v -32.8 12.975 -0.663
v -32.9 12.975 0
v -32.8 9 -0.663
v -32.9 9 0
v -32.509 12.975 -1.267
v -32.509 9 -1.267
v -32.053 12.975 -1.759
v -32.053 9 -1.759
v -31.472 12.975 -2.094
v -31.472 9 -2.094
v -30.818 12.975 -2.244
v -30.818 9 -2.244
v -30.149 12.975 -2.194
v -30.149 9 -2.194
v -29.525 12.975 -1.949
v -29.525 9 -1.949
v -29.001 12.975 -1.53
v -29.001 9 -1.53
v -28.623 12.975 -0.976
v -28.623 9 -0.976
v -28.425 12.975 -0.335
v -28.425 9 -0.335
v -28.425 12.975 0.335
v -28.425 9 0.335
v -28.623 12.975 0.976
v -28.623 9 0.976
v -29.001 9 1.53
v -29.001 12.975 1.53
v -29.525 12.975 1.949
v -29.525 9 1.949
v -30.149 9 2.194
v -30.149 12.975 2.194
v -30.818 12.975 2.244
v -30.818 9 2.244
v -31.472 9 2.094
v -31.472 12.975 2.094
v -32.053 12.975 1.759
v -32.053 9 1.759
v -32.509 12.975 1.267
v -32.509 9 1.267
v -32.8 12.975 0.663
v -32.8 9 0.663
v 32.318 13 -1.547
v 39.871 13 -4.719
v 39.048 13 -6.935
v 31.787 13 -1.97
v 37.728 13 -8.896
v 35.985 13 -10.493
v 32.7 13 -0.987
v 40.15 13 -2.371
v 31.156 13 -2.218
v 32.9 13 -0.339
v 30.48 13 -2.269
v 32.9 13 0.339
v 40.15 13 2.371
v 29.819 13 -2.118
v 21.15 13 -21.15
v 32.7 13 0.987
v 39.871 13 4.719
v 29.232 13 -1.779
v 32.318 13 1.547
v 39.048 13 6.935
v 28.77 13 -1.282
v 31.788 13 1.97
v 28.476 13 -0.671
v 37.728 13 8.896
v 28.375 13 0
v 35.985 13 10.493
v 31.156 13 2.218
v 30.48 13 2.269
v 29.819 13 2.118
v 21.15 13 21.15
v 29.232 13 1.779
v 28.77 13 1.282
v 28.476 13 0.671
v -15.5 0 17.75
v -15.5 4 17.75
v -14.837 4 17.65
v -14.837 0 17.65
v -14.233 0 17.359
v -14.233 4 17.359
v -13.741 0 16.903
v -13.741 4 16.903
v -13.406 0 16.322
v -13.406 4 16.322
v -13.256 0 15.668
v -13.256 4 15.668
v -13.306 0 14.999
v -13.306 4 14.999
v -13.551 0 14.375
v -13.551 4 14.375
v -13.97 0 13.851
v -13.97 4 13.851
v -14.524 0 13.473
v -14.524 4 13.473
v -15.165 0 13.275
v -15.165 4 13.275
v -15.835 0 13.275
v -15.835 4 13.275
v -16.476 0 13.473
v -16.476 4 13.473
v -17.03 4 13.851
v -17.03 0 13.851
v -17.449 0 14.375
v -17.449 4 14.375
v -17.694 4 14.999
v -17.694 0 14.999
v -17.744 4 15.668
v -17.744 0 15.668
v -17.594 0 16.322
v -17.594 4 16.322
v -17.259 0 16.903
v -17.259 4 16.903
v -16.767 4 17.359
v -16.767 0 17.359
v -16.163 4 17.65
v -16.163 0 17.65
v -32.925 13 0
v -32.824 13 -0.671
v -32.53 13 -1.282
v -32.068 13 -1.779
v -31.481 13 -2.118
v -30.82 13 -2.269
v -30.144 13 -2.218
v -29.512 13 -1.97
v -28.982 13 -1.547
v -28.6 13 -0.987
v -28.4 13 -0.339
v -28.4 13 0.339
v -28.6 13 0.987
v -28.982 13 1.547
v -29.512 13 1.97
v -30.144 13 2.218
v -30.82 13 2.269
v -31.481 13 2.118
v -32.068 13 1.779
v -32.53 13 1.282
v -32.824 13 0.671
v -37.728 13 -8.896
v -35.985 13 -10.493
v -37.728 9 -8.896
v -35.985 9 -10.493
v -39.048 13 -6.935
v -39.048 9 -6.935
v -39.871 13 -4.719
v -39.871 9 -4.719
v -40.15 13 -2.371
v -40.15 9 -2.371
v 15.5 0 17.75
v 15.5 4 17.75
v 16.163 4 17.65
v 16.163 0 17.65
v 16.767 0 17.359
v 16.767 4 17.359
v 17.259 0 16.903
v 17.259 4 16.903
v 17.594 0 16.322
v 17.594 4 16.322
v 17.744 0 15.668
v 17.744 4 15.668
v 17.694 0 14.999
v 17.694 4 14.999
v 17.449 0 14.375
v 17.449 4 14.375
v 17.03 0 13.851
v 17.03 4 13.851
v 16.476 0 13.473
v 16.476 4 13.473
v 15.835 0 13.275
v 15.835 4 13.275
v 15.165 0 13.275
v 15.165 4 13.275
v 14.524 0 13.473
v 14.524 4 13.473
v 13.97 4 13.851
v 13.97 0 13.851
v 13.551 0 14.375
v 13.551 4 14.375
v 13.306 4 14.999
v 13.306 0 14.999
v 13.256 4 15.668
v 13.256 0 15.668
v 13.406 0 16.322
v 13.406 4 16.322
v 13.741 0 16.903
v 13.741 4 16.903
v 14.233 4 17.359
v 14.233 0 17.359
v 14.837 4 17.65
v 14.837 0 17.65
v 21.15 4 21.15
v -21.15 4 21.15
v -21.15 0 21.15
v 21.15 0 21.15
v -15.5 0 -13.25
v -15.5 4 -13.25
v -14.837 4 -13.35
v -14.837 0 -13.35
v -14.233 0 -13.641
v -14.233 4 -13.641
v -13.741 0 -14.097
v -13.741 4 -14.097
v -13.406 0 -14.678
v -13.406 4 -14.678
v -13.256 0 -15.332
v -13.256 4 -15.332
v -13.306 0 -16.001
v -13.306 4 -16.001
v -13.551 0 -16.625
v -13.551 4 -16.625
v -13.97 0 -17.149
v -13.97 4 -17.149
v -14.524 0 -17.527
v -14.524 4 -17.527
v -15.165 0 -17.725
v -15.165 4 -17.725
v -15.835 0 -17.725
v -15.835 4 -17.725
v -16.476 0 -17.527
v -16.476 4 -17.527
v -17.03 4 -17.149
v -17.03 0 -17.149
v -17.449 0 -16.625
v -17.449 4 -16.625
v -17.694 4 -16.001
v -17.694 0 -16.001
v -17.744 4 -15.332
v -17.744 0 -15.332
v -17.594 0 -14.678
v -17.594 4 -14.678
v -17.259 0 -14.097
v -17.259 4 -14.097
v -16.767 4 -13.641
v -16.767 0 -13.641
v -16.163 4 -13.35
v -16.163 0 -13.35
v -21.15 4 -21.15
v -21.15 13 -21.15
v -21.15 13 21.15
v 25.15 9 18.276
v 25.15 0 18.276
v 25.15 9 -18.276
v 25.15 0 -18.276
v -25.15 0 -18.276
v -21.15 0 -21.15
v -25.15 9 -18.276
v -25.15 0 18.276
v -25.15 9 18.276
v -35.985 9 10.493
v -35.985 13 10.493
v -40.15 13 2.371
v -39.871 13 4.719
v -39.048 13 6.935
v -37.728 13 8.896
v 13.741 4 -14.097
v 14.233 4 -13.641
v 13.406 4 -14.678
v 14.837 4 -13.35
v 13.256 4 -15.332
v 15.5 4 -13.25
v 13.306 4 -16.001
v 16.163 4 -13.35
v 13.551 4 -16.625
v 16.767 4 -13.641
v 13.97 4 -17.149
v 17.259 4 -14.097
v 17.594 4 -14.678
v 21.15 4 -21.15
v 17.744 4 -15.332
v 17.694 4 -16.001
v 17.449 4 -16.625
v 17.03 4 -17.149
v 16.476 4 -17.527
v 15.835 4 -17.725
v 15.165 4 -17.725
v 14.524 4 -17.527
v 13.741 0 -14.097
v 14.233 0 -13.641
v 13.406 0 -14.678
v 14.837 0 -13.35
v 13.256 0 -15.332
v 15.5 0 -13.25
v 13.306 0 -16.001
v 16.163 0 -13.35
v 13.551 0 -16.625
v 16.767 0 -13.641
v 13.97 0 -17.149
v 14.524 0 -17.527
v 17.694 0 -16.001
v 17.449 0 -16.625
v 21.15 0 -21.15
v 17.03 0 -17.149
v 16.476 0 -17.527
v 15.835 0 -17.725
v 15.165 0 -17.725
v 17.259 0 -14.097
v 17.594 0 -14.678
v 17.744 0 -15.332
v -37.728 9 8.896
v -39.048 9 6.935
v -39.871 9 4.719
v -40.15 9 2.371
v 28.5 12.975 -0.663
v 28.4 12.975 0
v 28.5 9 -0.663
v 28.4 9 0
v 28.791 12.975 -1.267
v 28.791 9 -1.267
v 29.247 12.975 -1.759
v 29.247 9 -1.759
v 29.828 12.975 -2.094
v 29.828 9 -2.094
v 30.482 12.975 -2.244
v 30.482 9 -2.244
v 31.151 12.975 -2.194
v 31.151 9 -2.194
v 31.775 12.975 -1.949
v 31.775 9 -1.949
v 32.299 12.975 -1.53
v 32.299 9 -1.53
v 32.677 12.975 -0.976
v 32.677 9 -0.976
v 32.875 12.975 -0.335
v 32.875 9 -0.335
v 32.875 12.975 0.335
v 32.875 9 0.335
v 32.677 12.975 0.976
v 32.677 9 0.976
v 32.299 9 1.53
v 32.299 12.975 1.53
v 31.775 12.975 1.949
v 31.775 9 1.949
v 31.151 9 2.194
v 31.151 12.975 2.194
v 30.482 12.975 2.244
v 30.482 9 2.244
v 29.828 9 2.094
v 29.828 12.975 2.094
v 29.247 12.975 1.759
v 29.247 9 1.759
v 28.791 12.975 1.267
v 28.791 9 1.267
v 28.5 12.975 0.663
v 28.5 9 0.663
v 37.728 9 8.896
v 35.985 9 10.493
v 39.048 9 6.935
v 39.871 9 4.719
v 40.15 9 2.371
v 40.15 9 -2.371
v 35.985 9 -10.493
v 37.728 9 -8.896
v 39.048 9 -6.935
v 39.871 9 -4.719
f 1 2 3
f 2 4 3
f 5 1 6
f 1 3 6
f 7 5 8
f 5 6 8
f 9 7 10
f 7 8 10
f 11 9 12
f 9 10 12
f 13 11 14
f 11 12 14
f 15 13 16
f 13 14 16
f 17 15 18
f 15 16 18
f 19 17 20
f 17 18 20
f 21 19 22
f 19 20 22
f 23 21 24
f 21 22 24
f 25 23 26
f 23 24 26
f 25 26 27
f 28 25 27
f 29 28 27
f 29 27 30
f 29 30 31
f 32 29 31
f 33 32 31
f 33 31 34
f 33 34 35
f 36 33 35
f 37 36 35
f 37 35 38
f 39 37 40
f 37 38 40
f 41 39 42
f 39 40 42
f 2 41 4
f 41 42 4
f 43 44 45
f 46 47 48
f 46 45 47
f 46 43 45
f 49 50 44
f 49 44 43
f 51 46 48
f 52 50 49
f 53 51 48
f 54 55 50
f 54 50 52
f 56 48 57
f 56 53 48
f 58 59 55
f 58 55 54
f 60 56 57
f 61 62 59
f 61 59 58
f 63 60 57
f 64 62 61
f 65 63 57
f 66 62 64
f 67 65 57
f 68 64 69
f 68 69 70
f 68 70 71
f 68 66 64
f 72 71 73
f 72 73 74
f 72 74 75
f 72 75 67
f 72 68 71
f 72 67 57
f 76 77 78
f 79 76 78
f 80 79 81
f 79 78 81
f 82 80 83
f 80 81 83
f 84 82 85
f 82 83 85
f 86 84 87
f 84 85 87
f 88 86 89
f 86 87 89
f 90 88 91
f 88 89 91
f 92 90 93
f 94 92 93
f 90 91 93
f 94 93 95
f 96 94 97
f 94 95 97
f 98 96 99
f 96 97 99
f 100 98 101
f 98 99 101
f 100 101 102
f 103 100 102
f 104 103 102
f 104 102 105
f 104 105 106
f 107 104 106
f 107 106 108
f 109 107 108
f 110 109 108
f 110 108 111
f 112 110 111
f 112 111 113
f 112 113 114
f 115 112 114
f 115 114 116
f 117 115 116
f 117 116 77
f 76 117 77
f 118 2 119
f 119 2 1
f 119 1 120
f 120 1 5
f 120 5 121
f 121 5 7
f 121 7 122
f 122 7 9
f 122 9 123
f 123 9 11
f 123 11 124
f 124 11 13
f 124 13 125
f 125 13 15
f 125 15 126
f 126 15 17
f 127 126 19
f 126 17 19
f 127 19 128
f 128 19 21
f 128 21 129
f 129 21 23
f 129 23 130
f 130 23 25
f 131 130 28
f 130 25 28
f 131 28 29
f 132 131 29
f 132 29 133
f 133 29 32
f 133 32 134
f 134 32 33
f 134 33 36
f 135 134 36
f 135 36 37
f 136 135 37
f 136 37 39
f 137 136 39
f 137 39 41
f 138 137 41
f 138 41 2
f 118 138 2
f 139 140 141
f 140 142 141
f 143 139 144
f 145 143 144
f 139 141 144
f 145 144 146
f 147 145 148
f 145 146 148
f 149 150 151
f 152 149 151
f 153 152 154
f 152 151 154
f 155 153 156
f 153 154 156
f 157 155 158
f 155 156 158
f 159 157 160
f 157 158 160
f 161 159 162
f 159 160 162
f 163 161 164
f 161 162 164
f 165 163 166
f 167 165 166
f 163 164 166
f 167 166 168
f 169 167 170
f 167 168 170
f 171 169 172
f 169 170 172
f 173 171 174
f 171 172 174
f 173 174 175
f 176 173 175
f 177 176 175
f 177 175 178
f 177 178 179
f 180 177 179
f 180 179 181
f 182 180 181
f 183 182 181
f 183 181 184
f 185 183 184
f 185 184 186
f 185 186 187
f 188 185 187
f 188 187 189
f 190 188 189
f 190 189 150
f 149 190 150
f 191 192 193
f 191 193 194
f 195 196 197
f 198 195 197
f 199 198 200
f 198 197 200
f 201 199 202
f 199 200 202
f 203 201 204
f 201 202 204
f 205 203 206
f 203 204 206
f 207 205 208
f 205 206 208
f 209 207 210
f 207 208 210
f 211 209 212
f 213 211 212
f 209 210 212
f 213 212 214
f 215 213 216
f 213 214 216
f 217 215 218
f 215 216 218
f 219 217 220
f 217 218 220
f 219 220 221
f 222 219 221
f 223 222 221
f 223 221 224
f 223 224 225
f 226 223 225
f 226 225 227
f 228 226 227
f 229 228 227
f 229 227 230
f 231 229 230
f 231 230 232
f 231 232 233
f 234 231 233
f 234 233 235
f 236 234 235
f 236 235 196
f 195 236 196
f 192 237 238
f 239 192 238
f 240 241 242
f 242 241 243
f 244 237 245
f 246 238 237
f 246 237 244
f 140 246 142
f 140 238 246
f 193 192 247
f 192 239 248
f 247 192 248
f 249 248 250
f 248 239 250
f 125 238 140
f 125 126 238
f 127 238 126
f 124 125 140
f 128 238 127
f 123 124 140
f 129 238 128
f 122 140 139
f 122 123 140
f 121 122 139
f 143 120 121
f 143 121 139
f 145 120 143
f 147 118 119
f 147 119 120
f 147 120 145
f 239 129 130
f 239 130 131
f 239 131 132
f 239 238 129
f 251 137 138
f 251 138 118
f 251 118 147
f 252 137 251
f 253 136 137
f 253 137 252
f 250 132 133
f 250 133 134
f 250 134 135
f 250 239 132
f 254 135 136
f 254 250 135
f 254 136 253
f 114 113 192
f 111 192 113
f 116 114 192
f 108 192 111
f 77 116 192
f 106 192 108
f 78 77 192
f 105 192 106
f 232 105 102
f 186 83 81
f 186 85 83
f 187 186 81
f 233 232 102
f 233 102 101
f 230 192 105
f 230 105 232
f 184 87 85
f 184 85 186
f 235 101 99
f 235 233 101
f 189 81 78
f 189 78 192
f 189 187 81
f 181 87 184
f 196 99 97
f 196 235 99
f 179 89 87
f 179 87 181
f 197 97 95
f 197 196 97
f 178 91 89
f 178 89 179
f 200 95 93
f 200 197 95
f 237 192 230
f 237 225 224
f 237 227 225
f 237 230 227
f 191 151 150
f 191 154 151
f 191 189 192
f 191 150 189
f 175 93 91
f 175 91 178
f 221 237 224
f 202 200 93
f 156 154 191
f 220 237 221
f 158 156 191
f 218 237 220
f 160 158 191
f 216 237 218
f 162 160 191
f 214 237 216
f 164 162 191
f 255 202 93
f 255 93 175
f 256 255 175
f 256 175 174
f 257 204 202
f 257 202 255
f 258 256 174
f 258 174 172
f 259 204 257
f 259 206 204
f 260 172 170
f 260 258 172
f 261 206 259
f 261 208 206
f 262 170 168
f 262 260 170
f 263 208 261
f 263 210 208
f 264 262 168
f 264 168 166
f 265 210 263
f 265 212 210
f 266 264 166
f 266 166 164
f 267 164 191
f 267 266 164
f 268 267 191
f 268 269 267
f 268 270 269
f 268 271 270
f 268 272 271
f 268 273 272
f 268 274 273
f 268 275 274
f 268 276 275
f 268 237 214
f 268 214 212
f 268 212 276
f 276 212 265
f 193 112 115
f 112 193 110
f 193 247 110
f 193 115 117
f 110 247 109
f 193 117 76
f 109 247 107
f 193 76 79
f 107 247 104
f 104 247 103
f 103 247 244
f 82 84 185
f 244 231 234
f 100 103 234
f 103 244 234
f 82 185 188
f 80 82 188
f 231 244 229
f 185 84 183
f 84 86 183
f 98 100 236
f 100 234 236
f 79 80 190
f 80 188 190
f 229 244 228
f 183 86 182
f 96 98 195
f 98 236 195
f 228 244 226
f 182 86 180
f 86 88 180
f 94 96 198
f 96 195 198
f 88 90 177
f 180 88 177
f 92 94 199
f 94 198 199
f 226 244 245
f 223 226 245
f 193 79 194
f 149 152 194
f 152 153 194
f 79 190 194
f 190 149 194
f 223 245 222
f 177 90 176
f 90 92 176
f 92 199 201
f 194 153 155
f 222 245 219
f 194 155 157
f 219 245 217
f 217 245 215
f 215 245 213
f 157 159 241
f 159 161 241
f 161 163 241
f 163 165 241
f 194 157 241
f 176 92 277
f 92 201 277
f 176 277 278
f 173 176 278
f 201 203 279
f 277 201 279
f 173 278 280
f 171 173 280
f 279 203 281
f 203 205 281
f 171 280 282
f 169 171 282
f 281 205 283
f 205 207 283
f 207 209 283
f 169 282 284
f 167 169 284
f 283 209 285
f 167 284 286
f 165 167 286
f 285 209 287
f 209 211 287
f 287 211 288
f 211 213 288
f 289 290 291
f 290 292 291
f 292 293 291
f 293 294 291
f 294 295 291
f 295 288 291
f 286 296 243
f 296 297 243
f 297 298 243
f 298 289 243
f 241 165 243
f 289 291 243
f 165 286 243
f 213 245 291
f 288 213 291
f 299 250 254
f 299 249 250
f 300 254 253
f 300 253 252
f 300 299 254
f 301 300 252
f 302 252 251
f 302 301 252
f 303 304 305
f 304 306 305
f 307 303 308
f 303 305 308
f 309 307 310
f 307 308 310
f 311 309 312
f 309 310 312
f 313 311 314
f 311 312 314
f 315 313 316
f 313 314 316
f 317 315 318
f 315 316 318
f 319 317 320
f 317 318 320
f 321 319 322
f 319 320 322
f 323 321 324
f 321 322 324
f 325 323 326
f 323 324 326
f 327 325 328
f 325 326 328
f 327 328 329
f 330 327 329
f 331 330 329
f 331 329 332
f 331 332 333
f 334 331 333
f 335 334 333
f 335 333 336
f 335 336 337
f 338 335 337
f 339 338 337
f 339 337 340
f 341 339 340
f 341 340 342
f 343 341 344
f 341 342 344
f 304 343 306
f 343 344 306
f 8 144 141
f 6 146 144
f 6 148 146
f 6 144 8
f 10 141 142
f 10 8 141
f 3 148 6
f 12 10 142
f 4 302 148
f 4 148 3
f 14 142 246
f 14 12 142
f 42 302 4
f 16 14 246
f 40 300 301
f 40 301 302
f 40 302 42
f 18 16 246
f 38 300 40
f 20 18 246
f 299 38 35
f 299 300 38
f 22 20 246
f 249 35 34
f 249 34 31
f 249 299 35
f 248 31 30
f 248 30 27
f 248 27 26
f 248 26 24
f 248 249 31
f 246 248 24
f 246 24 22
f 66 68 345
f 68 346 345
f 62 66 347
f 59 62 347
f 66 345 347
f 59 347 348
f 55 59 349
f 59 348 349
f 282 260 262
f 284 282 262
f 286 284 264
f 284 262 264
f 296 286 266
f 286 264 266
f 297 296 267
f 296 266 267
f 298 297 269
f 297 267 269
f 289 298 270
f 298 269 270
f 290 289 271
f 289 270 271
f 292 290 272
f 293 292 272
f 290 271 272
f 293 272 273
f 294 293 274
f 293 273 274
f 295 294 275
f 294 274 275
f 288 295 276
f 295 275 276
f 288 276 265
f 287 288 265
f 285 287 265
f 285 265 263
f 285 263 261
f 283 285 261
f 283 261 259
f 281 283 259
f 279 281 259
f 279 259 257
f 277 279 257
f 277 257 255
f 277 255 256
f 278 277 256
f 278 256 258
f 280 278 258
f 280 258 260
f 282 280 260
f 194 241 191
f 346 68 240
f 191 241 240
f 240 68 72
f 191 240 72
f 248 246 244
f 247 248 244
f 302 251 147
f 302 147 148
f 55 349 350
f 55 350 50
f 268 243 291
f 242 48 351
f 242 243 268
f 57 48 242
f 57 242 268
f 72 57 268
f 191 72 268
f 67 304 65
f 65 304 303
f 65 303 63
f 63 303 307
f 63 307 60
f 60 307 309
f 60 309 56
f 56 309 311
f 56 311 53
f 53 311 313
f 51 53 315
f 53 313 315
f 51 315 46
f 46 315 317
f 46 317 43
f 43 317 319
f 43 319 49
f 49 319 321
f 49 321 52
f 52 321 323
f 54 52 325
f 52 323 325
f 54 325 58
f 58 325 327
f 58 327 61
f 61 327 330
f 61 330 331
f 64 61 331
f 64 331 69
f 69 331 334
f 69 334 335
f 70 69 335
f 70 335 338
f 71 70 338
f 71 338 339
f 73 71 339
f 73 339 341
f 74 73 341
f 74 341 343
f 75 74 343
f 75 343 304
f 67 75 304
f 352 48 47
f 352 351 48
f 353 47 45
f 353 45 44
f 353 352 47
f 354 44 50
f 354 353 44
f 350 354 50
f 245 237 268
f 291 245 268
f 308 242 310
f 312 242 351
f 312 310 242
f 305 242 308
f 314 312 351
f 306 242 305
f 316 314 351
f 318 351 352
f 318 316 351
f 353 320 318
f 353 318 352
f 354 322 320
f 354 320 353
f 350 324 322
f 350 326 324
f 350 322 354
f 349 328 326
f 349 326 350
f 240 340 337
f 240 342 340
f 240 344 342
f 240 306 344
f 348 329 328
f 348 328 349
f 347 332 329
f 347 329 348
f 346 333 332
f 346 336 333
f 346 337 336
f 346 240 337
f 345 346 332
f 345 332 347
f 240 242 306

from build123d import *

# Parameters (mm, degrees)
SCHIZZO1_W                     = 50.3
SCHIZZO1_H                     = 42.3
ESTRUSIONE_ESTRUSIONE1_DEPTH   = 4
ESTRUSIONE_ESTRUSIONE2_DEPTH   = 42.3
SCHIZZO4_R                     = 2.25
TAGLIO_ESTRUSIONE1_DEPTH       = 42.3
FORO_PER_VITE_M4_1_D           = 4.5
FORO_PER_VITE_M4_1_DEPTH       = 4
FORO_PER_VITE_M4_1_CSINK_D     = 4.55
FORO_PER_VITE_M4_1_CSINK_ANGLE = 90
FORO_PER_VITE_M4_1_TIP         = 1.351936393
TAGLIO_ESTRUSIONE2_DEPTH       = 42.3
RACCORDO1_R                    = 10


with BuildPart() as part:
    # Schizzo1 → Estrusione-Estrusione1 (new body)
    with BuildSketch(Plane(origin=(0, 0, 0), x_dir=(1, 0, 0), z_dir=(0, 1, 0))):
        Rectangle(SCHIZZO1_W, SCHIZZO1_H)
    extrude(amount=ESTRUSIONE_ESTRUSIONE1_DEPTH)

    # Schizzo3 → Estrusione-Estrusione2 (add)
    with BuildSketch(Plane.XY.offset(21.15)):
        Polygon((-21.15, 4), (-21.15, 13), (-40.15, 13), (-40.15, 9), (-25.15, 9), (-25.15, 4), align=None)
        Polygon((25.15, 4), (25.15, 9), (40.15, 9), (40.15, 13), (21.15, 13), (21.15, 4), align=None)
    extrude(amount=-ESTRUSIONE_ESTRUSIONE2_DEPTH)

    # Schizzo4 → Taglio-Estrusione1 (cut)
    with BuildSketch(Plane(origin=(0, 4, 0), x_dir=(1, 0, 0), z_dir=(0, 1, 0))):
        with Locations(Location((-15.5, 15.5, 0), (0, 0, 270))):
            Circle(SCHIZZO4_R)
        with Locations(Location((15.5, 15.5, 0), (0, 0, 270))):
            Circle(SCHIZZO4_R)
        with Locations(Location((15.5, -15.5, 0), (0, 0, 270))):
            Circle(SCHIZZO4_R)
        with Locations(Location((-15.5, -15.5, 0), (0, 0, 270))):
            Circle(SCHIZZO4_R)
    extrude(amount=-TAGLIO_ESTRUSIONE1_DEPTH, mode=Mode.SUBTRACT)

    # Foro per Vite M4-1
    with Locations(Plane(origin=(0, 13, 0), x_dir=(1, 0, 0), z_dir=(0, 1, 0))):
        with Locations((-30.65, 0), (30.65, 0)):
            CounterSinkHole(FORO_PER_VITE_M4_1_D / 2, FORO_PER_VITE_M4_1_CSINK_D / 2, depth=FORO_PER_VITE_M4_1_DEPTH, counter_sink_angle=FORO_PER_VITE_M4_1_CSINK_ANGLE)
            with Locations((0, 0, -(FORO_PER_VITE_M4_1_DEPTH + FORO_PER_VITE_M4_1_TIP / 2))):  # 118° drill point
                Cone(0, FORO_PER_VITE_M4_1_D / 2, FORO_PER_VITE_M4_1_TIP, mode=Mode.SUBTRACT)

    # Schizzo7 → Taglio-Estrusione2 (cut)
    with BuildSketch(Plane(origin=(0, 13, 0), x_dir=(1, 0, 0), z_dir=(0, 1, 0))):
        Polygon((-21.15, -21.15), (-40.15, -7.5), (-40.15, -21.15), align=None)
        Polygon((-21.15, 21.15), (-40.15, 7.5), (-40.15, 21.15), align=None)
        Polygon((21.15, 21.15), (40.15, 21.15), (40.15, 7.5), align=None)
        Polygon((21.15, -21.15), (40.15, -21.15), (40.15, -7.5), align=None)
    extrude(amount=-TAGLIO_ESTRUSIONE2_DEPTH, mode=Mode.SUBTRACT)

    # Raccordo1
    raccordo1_edges = [part.edges().sort_by_distance(p)[0] for p in [
        (40.15, 11, 7.5),
        (40.15, 11, -7.5),
        (-40.15, 11, -7.5),
        (-40.15, 11, 7.5),
    ]]
    fillet(raccordo1_edges, radius=RACCORDO1_R)


solid = part.part
